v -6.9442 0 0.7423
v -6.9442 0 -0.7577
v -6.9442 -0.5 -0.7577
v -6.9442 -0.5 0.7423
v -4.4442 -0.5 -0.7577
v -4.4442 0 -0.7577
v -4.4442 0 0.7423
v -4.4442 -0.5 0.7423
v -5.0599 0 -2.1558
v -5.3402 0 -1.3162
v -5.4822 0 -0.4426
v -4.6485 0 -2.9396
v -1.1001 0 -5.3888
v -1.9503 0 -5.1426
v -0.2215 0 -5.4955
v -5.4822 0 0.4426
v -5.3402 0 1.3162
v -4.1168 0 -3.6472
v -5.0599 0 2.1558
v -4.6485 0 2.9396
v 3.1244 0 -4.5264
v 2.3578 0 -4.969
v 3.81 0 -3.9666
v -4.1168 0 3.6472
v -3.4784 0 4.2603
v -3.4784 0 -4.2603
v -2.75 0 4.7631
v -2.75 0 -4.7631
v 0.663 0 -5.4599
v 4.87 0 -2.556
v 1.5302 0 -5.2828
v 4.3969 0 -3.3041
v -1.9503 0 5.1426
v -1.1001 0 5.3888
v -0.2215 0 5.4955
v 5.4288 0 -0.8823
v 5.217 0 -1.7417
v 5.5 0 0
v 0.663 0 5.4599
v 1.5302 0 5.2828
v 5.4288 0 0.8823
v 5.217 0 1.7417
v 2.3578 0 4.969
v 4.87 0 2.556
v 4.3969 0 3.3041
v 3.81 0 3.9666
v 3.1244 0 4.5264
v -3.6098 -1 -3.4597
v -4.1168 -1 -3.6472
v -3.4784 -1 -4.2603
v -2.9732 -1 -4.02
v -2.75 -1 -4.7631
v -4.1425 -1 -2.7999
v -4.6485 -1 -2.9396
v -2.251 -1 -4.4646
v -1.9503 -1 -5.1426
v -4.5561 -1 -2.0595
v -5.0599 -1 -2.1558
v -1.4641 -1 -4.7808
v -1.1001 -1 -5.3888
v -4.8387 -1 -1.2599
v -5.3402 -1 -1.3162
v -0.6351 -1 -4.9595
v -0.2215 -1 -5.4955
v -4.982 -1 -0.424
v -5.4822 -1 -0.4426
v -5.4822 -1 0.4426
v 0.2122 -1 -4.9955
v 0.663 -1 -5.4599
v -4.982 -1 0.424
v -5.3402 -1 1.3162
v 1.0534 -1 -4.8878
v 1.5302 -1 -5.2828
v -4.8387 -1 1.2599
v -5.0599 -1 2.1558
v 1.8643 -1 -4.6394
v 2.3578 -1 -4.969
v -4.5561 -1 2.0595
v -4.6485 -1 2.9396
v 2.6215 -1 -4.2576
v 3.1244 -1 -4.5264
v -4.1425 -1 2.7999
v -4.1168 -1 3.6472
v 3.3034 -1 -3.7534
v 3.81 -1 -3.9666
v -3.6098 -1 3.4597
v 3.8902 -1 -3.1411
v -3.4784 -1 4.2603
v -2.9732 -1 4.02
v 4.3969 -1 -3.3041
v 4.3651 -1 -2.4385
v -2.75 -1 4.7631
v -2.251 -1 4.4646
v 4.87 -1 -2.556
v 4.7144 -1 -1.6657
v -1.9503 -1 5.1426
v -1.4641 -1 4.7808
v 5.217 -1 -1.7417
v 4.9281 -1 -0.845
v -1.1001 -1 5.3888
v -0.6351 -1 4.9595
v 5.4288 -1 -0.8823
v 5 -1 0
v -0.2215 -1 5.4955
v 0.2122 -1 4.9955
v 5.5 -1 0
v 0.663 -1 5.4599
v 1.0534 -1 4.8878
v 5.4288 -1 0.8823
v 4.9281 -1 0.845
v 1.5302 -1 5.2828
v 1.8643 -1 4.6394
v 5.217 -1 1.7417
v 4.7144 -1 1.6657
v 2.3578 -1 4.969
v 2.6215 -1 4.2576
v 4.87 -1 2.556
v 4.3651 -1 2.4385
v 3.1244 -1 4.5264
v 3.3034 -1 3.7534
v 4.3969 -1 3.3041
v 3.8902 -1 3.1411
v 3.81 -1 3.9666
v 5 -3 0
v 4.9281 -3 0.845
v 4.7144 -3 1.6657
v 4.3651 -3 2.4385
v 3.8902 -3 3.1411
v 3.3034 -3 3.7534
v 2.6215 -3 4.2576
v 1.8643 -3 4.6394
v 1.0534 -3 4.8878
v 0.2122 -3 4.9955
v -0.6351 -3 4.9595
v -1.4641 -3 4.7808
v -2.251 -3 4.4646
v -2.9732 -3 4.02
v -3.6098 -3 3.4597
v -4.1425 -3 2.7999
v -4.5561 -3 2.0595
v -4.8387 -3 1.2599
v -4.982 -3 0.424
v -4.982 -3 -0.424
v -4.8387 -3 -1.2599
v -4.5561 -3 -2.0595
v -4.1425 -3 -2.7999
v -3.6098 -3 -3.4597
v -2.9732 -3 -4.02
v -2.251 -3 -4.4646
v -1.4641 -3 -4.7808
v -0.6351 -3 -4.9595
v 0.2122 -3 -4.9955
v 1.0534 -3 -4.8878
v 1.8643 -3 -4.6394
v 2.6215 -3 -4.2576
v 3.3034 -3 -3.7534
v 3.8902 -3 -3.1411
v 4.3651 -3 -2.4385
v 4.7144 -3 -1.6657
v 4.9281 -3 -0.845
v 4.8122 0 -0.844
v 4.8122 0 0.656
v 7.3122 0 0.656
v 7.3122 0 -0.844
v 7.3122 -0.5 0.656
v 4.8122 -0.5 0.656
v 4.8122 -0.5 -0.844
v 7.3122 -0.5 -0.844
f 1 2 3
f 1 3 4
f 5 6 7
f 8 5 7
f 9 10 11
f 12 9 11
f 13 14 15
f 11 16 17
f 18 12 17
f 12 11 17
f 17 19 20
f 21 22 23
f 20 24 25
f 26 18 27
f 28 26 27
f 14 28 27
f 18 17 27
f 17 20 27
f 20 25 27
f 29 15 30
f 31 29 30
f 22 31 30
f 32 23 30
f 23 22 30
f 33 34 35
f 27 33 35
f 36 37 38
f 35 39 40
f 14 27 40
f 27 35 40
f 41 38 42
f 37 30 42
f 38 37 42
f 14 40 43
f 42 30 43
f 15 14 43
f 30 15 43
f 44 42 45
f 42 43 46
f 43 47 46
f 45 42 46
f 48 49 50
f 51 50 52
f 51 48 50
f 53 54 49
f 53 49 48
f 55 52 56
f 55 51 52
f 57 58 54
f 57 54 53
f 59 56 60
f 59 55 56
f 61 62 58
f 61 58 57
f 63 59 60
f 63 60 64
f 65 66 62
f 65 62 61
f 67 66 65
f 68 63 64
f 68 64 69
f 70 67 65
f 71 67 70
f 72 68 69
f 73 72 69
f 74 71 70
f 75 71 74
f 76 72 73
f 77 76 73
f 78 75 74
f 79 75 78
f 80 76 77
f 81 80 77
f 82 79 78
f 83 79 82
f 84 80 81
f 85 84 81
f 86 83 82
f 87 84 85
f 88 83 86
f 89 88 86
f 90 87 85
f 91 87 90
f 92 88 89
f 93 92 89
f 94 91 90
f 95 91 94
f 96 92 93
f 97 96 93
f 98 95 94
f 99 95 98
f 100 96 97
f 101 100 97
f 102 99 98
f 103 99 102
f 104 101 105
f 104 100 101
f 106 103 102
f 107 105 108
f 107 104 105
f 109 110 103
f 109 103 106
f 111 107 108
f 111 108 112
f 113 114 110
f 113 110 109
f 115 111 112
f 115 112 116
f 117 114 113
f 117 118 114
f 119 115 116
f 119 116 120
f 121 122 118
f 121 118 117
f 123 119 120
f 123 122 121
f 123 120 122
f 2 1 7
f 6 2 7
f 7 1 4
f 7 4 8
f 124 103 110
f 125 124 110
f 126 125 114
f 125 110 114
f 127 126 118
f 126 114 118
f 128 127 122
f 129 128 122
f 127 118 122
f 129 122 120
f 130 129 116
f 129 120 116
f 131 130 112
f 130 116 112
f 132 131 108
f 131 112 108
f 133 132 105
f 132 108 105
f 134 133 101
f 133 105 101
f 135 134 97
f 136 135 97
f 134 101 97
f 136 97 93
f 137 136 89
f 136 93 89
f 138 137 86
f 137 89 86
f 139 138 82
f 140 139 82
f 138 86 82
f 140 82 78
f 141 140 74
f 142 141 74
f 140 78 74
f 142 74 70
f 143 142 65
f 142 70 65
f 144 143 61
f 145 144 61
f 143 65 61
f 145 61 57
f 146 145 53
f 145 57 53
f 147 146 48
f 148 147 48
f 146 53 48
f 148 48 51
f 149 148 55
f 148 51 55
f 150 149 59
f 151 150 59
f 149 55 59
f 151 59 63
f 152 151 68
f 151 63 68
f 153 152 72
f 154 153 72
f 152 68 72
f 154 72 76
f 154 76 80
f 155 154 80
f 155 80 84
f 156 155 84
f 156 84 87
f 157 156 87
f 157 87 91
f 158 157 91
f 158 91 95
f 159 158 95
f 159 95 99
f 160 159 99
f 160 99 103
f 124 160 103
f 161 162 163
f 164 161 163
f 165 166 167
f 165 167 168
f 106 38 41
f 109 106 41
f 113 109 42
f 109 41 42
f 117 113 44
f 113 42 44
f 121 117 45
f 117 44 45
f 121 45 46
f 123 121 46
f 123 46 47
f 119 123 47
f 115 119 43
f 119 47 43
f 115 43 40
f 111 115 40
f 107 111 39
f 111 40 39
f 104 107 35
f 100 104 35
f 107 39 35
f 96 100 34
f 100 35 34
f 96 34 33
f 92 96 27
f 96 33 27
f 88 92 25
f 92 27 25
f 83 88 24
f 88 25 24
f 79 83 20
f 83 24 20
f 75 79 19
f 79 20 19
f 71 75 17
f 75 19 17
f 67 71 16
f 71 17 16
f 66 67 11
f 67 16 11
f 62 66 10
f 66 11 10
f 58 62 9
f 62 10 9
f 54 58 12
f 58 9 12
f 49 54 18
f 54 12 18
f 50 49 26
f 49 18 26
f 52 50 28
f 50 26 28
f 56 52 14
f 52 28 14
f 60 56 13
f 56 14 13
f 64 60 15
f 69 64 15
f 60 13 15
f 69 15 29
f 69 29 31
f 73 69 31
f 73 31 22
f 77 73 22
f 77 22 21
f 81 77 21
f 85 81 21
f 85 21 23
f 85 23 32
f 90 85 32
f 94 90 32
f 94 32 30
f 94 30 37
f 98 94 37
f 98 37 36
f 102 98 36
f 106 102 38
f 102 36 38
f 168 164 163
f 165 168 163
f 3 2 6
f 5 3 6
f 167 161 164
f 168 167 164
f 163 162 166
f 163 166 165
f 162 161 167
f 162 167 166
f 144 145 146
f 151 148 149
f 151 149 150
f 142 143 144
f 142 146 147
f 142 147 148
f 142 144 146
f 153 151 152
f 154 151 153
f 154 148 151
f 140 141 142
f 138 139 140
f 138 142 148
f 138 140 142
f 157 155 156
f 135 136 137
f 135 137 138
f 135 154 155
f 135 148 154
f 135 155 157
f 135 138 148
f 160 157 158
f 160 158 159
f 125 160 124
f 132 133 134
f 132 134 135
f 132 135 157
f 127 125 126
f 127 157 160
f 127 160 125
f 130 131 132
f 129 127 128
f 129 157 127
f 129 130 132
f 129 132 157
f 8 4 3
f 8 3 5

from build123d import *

# Parameters (mm, degrees)
F0_R     = 5.5
F1_DEPTH = 1
F2_R     = 5
F3_DEPTH = 2
F4_W     = 2.5
F4_H     = 1.5
F6_DEPTH = 0.5
F5_W     = 2.5
F5_H     = 1.5
F7_DEPTH = 0.5


with BuildPart() as f1:
    # F0 (on Front) → F1 (new body)
    with BuildSketch(Plane.XZ):
        Circle(F0_R)
    extrude(amount=F1_DEPTH)

    # F2 (on face) → F3 (join)
    with BuildSketch(Plane.XZ.offset(1)):
        Circle(F2_R)
    extrude(amount=F3_DEPTH)


with BuildPart() as f6:
    # F4 (on Front) → F6 (new body)
    with BuildSketch(Plane.XZ):
        with Locations((6.062192, -0.093952)):
            Rectangle(F4_W, F4_H)
    extrude(amount=F6_DEPTH)


with BuildPart() as f7:
    # F5 (on Front) → F7 (new body)
    with BuildSketch(Plane.XZ):
        with Locations((-5.694214, -0.007719)):
            Rectangle(F5_W, F5_H)
    extrude(amount=F7_DEPTH)


solid = Compound([f1.part, f6.part, f7.part])
